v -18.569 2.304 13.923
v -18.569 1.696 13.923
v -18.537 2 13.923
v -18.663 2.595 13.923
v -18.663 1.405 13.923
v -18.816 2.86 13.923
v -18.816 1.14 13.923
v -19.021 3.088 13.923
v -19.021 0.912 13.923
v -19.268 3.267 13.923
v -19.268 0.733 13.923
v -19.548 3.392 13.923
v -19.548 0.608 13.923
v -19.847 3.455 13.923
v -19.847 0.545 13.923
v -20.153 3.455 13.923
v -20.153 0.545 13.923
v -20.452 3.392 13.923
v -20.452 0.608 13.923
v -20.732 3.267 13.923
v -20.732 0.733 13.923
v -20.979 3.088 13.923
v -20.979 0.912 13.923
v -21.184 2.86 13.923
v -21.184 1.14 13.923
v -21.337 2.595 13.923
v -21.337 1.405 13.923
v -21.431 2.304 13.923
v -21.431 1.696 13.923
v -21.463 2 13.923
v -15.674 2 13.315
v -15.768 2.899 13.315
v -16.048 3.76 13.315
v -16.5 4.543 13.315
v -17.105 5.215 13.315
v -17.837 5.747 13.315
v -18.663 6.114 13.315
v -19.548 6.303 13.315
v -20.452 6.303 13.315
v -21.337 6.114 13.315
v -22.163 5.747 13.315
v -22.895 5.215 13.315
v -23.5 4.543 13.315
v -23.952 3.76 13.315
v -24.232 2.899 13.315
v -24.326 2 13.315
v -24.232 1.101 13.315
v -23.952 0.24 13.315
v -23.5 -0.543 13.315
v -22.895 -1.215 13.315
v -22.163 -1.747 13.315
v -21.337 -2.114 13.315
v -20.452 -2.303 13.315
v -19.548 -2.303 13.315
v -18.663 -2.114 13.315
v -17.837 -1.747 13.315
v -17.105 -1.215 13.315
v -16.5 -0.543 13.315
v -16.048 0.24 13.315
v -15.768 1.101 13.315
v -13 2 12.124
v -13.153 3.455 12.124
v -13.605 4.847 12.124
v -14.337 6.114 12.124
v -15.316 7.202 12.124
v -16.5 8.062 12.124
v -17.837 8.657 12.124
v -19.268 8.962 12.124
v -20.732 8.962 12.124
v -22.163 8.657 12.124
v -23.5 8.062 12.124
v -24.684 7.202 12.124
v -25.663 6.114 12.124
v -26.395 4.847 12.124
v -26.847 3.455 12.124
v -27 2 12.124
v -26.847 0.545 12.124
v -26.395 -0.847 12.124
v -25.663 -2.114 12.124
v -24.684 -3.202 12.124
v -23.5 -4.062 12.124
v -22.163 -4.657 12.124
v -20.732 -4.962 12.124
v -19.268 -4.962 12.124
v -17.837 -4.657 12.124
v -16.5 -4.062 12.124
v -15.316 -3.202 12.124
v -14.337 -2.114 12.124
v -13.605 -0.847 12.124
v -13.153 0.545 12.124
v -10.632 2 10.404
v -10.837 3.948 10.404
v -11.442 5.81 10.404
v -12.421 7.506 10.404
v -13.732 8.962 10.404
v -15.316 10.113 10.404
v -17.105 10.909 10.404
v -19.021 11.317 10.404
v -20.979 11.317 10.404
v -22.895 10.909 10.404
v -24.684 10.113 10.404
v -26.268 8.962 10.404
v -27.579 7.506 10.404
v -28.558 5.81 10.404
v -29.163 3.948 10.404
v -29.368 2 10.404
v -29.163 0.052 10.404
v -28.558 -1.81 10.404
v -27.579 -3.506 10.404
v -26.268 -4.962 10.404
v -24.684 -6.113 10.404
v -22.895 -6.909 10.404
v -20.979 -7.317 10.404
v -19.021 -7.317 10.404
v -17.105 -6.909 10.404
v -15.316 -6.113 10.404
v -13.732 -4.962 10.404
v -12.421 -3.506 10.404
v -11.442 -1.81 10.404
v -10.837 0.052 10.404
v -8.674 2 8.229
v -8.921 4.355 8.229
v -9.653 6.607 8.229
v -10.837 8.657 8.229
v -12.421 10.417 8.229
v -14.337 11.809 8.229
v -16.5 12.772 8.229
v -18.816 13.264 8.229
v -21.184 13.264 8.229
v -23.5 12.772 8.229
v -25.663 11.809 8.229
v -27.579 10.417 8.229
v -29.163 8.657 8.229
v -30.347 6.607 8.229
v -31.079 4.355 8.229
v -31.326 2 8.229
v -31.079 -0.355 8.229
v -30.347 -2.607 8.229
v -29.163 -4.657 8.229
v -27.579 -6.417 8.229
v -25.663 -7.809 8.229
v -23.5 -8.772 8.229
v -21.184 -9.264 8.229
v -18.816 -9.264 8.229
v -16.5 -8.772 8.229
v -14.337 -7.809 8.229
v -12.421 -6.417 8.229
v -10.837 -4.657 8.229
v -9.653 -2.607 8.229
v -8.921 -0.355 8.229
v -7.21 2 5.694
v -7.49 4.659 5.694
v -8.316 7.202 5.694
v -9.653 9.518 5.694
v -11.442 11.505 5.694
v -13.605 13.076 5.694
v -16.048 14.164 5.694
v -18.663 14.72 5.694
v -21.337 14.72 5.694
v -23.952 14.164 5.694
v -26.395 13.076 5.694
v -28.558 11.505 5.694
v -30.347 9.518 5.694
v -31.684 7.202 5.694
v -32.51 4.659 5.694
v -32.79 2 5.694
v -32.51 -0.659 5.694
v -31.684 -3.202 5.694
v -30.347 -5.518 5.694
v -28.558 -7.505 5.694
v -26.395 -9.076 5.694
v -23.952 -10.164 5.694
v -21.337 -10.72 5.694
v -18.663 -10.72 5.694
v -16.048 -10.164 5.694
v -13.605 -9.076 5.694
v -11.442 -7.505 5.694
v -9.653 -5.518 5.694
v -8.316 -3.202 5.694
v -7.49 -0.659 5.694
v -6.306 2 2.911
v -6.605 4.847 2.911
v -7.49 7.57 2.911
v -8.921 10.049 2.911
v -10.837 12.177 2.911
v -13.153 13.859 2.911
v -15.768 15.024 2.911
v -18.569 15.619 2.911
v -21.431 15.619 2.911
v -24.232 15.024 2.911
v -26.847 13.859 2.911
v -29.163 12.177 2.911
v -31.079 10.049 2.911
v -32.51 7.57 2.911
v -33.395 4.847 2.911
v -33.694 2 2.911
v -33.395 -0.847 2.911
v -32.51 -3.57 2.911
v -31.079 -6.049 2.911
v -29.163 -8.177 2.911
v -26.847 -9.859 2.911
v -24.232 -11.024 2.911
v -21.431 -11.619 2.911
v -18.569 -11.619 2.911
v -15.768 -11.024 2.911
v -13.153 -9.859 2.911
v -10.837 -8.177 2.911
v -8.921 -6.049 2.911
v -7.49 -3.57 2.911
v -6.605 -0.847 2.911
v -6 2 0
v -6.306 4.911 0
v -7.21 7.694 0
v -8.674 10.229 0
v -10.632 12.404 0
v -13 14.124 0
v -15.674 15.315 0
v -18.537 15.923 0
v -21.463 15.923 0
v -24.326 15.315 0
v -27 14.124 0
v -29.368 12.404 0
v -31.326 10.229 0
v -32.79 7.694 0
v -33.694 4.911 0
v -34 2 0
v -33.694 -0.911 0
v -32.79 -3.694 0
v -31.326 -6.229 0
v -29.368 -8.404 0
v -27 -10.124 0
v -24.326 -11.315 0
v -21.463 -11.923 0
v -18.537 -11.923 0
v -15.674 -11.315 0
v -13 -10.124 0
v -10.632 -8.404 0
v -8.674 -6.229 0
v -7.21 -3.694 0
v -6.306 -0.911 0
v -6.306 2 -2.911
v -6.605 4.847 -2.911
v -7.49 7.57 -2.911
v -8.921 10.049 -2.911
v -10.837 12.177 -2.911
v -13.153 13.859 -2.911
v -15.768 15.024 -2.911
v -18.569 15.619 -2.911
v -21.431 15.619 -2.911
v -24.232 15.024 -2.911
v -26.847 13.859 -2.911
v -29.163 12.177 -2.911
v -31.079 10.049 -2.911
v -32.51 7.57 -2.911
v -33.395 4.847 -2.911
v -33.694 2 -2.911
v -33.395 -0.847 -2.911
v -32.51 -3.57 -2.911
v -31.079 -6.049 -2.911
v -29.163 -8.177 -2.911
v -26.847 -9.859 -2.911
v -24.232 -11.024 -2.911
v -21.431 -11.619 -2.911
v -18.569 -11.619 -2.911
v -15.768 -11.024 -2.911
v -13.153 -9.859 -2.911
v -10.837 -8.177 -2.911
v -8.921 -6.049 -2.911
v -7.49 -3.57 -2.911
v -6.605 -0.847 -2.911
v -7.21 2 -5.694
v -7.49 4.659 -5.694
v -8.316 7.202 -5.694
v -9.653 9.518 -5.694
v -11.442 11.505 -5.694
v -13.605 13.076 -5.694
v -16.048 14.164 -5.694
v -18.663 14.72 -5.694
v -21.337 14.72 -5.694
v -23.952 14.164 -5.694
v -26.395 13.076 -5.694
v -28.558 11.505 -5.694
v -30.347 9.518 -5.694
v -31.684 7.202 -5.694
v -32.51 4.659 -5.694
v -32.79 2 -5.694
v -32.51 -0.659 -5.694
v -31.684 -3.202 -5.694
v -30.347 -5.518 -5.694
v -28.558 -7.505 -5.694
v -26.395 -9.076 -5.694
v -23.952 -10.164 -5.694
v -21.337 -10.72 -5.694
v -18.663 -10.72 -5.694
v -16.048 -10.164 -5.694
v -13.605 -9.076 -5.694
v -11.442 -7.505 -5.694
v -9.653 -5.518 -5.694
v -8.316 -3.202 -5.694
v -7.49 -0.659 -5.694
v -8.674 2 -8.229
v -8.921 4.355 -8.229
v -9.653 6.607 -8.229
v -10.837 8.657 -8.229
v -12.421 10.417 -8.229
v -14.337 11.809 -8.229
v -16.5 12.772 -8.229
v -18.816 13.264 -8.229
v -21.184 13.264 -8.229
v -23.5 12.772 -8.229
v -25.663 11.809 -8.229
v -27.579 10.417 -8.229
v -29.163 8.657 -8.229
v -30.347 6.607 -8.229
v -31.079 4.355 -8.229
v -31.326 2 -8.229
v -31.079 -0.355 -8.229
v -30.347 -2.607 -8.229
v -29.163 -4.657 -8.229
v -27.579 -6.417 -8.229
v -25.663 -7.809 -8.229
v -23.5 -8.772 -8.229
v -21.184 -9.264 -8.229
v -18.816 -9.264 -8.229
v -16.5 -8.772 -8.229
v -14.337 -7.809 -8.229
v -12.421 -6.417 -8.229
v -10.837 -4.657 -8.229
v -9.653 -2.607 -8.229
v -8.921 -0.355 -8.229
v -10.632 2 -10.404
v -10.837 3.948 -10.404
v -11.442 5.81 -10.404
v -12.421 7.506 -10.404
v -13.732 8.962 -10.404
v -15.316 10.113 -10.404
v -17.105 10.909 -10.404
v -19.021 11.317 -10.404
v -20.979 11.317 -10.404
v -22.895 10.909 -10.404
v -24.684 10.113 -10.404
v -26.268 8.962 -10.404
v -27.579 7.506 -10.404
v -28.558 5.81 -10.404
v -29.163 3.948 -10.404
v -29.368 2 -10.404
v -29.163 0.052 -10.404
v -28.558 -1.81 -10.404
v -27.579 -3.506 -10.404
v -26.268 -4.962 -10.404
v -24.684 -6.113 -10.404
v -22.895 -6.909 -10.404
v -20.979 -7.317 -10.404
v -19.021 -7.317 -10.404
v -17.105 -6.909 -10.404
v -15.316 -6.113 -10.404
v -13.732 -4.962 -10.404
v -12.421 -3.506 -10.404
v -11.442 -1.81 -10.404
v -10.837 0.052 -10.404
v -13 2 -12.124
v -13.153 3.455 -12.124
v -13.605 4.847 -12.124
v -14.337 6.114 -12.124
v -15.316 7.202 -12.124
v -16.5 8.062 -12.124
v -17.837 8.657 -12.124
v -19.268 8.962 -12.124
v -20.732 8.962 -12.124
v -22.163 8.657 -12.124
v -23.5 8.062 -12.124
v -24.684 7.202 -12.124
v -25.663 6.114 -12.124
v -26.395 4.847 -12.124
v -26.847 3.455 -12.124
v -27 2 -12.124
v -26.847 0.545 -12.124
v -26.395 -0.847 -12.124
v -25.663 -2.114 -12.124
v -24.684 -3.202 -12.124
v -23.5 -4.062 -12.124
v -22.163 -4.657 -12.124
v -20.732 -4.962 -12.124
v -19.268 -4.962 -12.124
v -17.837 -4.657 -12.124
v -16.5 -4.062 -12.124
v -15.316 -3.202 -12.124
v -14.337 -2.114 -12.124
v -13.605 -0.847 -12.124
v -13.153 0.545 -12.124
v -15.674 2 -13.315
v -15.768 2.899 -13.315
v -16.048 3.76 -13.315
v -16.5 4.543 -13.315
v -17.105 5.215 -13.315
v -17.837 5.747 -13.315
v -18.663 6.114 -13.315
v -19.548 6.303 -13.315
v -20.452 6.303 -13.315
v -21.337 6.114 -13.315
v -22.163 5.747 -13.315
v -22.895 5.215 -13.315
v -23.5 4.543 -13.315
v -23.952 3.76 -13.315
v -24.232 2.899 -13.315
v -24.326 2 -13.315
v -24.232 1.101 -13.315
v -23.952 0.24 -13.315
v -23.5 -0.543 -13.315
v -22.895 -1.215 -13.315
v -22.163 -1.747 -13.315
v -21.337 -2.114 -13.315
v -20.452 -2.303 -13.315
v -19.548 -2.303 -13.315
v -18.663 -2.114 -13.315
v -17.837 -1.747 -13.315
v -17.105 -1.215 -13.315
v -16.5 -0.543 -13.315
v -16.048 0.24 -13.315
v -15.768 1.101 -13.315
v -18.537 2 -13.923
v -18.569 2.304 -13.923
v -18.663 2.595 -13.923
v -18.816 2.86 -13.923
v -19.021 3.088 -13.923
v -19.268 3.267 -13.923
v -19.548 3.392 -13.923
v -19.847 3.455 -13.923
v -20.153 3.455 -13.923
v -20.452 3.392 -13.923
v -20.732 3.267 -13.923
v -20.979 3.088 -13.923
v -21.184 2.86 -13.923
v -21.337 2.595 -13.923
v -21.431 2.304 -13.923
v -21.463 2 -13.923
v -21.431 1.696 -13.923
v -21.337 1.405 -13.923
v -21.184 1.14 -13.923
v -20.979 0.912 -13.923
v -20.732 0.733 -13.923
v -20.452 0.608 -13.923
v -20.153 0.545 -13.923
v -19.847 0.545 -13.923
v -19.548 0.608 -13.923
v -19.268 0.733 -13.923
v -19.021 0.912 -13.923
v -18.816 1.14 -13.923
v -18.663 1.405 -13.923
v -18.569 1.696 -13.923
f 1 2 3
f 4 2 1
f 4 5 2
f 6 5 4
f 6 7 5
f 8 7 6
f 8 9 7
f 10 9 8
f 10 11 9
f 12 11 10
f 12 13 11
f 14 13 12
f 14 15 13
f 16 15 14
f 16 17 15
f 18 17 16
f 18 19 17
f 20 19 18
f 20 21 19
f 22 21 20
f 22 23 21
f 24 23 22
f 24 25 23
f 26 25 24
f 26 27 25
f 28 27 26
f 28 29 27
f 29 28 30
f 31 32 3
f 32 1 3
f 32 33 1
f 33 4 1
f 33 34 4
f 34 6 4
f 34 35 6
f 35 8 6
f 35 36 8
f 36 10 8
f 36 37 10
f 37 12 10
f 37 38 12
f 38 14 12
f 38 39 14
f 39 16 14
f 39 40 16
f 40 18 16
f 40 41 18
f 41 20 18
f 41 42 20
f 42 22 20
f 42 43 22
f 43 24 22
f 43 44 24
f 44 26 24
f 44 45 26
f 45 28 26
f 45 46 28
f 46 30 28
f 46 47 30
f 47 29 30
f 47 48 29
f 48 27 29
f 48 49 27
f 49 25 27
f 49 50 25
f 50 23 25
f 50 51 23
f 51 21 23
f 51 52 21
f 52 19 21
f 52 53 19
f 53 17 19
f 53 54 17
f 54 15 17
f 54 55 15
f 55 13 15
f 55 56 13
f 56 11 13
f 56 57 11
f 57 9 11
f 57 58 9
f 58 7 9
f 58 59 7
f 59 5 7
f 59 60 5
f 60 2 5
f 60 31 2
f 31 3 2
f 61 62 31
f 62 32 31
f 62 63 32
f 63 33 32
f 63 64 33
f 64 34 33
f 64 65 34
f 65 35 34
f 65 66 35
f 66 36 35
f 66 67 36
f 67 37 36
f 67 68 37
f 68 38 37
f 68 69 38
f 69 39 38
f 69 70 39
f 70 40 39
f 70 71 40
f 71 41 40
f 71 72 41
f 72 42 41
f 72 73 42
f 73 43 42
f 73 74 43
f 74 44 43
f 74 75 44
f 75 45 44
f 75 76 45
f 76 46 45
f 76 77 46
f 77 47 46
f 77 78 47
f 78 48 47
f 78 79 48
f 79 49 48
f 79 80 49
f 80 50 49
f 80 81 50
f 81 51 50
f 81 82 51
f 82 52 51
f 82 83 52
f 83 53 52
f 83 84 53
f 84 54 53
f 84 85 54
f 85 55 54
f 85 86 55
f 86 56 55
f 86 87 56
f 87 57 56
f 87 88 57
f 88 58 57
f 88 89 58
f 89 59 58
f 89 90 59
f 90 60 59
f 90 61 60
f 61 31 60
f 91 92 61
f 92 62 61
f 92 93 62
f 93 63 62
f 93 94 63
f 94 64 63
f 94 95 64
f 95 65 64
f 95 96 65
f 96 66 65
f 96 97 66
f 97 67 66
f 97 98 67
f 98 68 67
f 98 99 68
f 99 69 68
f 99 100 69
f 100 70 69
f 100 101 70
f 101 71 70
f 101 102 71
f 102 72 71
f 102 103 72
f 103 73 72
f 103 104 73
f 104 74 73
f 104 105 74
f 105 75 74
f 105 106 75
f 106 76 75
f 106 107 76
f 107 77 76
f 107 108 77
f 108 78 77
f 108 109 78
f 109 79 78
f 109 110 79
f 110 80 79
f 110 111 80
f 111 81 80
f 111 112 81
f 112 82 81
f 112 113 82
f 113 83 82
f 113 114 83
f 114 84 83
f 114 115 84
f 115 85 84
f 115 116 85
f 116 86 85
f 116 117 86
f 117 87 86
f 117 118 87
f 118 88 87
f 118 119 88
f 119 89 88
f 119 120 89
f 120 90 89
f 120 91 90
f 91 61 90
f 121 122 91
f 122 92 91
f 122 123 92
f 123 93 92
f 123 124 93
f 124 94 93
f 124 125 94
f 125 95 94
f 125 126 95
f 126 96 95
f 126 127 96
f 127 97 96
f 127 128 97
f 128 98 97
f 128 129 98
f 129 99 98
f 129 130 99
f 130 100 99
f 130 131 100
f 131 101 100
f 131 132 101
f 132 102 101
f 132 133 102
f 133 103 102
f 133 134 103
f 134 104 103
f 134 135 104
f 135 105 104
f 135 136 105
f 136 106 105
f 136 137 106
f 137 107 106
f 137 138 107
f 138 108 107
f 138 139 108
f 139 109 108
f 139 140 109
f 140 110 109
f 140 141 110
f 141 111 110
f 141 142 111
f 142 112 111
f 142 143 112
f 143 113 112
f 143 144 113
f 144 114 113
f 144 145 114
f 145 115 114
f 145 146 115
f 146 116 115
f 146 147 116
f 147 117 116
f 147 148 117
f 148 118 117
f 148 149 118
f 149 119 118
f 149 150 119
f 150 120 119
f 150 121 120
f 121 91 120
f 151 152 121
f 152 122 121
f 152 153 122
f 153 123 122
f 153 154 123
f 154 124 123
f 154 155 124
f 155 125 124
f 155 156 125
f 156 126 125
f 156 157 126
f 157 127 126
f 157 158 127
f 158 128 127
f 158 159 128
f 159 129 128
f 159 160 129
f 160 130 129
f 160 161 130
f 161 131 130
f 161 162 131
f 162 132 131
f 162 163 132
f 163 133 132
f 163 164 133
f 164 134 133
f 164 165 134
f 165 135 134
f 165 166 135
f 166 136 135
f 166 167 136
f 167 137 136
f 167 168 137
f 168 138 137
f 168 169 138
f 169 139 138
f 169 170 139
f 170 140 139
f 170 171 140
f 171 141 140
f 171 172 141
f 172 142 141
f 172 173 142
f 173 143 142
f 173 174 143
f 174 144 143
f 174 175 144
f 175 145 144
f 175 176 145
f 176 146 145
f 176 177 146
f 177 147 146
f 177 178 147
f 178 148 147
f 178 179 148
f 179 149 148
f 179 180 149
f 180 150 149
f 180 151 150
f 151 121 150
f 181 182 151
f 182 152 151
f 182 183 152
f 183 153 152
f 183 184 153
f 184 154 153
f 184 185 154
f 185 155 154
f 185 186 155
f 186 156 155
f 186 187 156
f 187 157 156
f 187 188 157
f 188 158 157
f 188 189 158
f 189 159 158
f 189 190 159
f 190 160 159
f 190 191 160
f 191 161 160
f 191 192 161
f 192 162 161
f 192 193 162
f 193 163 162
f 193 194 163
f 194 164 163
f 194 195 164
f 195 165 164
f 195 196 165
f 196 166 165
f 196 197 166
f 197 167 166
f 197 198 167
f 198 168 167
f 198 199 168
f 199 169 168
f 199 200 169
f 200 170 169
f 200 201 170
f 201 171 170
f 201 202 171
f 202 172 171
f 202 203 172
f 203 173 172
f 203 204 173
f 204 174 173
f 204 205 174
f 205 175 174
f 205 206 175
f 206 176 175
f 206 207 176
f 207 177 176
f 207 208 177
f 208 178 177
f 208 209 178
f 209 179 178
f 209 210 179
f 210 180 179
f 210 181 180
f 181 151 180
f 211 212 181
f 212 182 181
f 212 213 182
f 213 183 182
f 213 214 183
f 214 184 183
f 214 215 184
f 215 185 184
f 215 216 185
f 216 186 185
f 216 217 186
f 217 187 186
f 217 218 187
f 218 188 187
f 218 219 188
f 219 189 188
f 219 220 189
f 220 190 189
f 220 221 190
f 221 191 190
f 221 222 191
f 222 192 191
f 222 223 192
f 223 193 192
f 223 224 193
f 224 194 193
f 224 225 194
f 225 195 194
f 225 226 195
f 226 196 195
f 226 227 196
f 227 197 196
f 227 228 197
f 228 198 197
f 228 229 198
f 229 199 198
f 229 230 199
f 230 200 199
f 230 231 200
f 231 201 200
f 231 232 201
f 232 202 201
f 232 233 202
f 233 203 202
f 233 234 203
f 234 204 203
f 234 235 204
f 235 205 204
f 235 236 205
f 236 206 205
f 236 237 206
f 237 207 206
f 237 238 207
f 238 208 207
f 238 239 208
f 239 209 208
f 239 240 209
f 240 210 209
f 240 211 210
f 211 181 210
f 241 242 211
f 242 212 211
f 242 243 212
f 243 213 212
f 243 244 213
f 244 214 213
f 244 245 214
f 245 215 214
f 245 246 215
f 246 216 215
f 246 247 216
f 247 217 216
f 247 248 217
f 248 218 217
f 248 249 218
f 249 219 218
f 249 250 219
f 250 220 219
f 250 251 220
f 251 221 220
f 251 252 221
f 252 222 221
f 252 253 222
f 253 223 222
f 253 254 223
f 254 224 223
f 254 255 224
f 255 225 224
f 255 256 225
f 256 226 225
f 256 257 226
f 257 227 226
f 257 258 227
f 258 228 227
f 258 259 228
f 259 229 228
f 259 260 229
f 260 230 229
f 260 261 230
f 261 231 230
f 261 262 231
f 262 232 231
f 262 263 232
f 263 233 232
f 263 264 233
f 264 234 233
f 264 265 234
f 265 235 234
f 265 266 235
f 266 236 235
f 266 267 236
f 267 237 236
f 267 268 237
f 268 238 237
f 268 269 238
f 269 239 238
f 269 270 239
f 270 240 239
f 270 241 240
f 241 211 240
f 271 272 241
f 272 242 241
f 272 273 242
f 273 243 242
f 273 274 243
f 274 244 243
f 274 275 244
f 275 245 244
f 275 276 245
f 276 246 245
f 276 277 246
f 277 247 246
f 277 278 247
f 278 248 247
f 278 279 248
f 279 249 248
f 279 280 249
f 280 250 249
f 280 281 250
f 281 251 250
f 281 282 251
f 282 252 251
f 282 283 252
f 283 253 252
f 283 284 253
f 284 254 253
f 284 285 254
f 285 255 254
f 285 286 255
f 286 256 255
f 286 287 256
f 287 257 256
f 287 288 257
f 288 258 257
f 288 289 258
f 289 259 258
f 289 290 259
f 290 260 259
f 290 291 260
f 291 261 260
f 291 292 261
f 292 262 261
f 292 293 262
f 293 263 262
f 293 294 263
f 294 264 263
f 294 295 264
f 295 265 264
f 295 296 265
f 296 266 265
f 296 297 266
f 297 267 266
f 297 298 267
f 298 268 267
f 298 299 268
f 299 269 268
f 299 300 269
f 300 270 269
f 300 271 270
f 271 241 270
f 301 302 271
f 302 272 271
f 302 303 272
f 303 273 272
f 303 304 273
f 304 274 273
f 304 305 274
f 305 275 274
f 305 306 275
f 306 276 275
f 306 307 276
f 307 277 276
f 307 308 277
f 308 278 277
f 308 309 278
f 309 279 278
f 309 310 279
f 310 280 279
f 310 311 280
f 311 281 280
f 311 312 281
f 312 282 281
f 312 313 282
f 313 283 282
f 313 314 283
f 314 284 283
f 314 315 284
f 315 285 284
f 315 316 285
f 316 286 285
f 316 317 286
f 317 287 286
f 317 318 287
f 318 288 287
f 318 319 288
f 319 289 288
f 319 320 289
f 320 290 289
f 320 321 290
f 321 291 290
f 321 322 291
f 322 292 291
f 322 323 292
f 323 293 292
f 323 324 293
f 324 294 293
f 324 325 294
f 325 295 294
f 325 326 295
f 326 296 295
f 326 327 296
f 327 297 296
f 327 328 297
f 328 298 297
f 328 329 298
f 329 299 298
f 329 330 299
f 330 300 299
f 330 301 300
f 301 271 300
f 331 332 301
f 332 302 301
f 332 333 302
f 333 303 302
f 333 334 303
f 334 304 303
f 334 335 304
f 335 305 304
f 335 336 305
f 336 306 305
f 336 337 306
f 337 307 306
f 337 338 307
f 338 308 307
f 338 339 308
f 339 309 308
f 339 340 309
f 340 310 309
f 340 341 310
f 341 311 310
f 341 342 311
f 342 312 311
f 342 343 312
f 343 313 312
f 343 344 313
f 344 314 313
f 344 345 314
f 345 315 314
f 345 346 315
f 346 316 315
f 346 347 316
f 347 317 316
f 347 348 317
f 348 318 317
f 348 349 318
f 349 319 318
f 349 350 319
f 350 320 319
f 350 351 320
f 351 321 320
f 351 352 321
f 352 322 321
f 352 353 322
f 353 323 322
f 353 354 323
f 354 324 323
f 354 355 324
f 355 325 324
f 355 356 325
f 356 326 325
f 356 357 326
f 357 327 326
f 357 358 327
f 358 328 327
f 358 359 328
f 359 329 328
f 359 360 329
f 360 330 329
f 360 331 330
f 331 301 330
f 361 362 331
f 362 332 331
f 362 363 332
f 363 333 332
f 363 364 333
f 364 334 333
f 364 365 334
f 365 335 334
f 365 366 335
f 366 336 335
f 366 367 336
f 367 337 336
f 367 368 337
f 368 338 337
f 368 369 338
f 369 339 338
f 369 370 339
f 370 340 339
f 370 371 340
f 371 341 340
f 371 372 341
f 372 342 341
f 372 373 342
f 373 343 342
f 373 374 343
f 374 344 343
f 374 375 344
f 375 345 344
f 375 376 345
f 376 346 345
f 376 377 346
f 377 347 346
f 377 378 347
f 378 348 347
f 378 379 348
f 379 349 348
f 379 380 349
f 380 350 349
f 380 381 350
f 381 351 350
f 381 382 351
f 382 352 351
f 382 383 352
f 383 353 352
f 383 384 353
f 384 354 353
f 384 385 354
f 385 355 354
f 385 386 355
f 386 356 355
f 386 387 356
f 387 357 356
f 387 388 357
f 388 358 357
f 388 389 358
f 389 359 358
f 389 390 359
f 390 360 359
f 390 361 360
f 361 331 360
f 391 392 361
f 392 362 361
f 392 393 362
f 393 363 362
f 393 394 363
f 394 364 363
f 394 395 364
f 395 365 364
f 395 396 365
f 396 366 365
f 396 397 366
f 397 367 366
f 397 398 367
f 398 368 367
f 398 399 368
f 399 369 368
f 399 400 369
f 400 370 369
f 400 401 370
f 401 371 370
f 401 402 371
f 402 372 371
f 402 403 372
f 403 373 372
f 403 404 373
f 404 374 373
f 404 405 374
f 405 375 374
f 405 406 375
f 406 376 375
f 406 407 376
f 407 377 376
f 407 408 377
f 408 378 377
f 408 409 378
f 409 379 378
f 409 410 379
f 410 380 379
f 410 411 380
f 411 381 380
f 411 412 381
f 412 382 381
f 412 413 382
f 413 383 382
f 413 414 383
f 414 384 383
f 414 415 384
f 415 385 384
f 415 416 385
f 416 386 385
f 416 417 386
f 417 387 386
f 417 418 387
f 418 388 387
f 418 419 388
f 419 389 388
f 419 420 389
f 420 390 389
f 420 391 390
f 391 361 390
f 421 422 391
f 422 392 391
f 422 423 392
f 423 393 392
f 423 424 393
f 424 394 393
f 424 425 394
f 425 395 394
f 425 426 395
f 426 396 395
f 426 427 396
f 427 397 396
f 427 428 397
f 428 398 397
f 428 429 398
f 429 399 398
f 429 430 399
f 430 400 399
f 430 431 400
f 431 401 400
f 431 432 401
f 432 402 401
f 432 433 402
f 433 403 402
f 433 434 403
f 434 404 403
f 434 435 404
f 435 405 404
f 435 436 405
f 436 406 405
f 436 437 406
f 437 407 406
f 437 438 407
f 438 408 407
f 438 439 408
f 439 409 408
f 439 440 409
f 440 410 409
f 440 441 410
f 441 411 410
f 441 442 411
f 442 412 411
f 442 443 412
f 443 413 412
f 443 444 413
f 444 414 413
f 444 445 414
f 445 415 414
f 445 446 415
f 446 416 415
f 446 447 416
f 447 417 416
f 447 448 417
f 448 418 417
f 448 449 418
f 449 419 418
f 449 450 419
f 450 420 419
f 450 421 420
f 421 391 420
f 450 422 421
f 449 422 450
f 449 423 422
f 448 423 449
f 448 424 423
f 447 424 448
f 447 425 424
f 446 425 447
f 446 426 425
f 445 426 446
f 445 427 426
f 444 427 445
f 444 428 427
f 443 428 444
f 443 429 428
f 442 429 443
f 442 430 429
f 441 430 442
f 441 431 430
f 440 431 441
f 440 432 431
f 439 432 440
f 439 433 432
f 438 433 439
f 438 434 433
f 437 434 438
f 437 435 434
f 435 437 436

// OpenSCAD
//goggles
//union(){}
//intersection(){

//cylinder(height, r1, r2, center=true/false)

/*
union(){

union(){
translate([8,0,0]) rotate([90,90,90]) cylinder(1,12,12);
difference(){
translate([0,0,0]) rotate([90,90,90]) cylinder(8,16,12);
translate([0,0,0]) rotate([90,90,90]) cylinder(8,14,10);
}
}

//translate([-16,0,0])
difference(){
difference(){
translate([-12,0,0]) rotate([90,90,90]) cylinder(12,20,16);
translate([-12,0,0]) rotate([90,90,90]) cylinder(12,18,14);
}
*/

//sphere cut
translate([-20,2,0]) sphere(14);
//cylinder cut
//translate([-20,2,0]) rotate([97,90,90]) cylinder(20,28,14);


//}
//}
